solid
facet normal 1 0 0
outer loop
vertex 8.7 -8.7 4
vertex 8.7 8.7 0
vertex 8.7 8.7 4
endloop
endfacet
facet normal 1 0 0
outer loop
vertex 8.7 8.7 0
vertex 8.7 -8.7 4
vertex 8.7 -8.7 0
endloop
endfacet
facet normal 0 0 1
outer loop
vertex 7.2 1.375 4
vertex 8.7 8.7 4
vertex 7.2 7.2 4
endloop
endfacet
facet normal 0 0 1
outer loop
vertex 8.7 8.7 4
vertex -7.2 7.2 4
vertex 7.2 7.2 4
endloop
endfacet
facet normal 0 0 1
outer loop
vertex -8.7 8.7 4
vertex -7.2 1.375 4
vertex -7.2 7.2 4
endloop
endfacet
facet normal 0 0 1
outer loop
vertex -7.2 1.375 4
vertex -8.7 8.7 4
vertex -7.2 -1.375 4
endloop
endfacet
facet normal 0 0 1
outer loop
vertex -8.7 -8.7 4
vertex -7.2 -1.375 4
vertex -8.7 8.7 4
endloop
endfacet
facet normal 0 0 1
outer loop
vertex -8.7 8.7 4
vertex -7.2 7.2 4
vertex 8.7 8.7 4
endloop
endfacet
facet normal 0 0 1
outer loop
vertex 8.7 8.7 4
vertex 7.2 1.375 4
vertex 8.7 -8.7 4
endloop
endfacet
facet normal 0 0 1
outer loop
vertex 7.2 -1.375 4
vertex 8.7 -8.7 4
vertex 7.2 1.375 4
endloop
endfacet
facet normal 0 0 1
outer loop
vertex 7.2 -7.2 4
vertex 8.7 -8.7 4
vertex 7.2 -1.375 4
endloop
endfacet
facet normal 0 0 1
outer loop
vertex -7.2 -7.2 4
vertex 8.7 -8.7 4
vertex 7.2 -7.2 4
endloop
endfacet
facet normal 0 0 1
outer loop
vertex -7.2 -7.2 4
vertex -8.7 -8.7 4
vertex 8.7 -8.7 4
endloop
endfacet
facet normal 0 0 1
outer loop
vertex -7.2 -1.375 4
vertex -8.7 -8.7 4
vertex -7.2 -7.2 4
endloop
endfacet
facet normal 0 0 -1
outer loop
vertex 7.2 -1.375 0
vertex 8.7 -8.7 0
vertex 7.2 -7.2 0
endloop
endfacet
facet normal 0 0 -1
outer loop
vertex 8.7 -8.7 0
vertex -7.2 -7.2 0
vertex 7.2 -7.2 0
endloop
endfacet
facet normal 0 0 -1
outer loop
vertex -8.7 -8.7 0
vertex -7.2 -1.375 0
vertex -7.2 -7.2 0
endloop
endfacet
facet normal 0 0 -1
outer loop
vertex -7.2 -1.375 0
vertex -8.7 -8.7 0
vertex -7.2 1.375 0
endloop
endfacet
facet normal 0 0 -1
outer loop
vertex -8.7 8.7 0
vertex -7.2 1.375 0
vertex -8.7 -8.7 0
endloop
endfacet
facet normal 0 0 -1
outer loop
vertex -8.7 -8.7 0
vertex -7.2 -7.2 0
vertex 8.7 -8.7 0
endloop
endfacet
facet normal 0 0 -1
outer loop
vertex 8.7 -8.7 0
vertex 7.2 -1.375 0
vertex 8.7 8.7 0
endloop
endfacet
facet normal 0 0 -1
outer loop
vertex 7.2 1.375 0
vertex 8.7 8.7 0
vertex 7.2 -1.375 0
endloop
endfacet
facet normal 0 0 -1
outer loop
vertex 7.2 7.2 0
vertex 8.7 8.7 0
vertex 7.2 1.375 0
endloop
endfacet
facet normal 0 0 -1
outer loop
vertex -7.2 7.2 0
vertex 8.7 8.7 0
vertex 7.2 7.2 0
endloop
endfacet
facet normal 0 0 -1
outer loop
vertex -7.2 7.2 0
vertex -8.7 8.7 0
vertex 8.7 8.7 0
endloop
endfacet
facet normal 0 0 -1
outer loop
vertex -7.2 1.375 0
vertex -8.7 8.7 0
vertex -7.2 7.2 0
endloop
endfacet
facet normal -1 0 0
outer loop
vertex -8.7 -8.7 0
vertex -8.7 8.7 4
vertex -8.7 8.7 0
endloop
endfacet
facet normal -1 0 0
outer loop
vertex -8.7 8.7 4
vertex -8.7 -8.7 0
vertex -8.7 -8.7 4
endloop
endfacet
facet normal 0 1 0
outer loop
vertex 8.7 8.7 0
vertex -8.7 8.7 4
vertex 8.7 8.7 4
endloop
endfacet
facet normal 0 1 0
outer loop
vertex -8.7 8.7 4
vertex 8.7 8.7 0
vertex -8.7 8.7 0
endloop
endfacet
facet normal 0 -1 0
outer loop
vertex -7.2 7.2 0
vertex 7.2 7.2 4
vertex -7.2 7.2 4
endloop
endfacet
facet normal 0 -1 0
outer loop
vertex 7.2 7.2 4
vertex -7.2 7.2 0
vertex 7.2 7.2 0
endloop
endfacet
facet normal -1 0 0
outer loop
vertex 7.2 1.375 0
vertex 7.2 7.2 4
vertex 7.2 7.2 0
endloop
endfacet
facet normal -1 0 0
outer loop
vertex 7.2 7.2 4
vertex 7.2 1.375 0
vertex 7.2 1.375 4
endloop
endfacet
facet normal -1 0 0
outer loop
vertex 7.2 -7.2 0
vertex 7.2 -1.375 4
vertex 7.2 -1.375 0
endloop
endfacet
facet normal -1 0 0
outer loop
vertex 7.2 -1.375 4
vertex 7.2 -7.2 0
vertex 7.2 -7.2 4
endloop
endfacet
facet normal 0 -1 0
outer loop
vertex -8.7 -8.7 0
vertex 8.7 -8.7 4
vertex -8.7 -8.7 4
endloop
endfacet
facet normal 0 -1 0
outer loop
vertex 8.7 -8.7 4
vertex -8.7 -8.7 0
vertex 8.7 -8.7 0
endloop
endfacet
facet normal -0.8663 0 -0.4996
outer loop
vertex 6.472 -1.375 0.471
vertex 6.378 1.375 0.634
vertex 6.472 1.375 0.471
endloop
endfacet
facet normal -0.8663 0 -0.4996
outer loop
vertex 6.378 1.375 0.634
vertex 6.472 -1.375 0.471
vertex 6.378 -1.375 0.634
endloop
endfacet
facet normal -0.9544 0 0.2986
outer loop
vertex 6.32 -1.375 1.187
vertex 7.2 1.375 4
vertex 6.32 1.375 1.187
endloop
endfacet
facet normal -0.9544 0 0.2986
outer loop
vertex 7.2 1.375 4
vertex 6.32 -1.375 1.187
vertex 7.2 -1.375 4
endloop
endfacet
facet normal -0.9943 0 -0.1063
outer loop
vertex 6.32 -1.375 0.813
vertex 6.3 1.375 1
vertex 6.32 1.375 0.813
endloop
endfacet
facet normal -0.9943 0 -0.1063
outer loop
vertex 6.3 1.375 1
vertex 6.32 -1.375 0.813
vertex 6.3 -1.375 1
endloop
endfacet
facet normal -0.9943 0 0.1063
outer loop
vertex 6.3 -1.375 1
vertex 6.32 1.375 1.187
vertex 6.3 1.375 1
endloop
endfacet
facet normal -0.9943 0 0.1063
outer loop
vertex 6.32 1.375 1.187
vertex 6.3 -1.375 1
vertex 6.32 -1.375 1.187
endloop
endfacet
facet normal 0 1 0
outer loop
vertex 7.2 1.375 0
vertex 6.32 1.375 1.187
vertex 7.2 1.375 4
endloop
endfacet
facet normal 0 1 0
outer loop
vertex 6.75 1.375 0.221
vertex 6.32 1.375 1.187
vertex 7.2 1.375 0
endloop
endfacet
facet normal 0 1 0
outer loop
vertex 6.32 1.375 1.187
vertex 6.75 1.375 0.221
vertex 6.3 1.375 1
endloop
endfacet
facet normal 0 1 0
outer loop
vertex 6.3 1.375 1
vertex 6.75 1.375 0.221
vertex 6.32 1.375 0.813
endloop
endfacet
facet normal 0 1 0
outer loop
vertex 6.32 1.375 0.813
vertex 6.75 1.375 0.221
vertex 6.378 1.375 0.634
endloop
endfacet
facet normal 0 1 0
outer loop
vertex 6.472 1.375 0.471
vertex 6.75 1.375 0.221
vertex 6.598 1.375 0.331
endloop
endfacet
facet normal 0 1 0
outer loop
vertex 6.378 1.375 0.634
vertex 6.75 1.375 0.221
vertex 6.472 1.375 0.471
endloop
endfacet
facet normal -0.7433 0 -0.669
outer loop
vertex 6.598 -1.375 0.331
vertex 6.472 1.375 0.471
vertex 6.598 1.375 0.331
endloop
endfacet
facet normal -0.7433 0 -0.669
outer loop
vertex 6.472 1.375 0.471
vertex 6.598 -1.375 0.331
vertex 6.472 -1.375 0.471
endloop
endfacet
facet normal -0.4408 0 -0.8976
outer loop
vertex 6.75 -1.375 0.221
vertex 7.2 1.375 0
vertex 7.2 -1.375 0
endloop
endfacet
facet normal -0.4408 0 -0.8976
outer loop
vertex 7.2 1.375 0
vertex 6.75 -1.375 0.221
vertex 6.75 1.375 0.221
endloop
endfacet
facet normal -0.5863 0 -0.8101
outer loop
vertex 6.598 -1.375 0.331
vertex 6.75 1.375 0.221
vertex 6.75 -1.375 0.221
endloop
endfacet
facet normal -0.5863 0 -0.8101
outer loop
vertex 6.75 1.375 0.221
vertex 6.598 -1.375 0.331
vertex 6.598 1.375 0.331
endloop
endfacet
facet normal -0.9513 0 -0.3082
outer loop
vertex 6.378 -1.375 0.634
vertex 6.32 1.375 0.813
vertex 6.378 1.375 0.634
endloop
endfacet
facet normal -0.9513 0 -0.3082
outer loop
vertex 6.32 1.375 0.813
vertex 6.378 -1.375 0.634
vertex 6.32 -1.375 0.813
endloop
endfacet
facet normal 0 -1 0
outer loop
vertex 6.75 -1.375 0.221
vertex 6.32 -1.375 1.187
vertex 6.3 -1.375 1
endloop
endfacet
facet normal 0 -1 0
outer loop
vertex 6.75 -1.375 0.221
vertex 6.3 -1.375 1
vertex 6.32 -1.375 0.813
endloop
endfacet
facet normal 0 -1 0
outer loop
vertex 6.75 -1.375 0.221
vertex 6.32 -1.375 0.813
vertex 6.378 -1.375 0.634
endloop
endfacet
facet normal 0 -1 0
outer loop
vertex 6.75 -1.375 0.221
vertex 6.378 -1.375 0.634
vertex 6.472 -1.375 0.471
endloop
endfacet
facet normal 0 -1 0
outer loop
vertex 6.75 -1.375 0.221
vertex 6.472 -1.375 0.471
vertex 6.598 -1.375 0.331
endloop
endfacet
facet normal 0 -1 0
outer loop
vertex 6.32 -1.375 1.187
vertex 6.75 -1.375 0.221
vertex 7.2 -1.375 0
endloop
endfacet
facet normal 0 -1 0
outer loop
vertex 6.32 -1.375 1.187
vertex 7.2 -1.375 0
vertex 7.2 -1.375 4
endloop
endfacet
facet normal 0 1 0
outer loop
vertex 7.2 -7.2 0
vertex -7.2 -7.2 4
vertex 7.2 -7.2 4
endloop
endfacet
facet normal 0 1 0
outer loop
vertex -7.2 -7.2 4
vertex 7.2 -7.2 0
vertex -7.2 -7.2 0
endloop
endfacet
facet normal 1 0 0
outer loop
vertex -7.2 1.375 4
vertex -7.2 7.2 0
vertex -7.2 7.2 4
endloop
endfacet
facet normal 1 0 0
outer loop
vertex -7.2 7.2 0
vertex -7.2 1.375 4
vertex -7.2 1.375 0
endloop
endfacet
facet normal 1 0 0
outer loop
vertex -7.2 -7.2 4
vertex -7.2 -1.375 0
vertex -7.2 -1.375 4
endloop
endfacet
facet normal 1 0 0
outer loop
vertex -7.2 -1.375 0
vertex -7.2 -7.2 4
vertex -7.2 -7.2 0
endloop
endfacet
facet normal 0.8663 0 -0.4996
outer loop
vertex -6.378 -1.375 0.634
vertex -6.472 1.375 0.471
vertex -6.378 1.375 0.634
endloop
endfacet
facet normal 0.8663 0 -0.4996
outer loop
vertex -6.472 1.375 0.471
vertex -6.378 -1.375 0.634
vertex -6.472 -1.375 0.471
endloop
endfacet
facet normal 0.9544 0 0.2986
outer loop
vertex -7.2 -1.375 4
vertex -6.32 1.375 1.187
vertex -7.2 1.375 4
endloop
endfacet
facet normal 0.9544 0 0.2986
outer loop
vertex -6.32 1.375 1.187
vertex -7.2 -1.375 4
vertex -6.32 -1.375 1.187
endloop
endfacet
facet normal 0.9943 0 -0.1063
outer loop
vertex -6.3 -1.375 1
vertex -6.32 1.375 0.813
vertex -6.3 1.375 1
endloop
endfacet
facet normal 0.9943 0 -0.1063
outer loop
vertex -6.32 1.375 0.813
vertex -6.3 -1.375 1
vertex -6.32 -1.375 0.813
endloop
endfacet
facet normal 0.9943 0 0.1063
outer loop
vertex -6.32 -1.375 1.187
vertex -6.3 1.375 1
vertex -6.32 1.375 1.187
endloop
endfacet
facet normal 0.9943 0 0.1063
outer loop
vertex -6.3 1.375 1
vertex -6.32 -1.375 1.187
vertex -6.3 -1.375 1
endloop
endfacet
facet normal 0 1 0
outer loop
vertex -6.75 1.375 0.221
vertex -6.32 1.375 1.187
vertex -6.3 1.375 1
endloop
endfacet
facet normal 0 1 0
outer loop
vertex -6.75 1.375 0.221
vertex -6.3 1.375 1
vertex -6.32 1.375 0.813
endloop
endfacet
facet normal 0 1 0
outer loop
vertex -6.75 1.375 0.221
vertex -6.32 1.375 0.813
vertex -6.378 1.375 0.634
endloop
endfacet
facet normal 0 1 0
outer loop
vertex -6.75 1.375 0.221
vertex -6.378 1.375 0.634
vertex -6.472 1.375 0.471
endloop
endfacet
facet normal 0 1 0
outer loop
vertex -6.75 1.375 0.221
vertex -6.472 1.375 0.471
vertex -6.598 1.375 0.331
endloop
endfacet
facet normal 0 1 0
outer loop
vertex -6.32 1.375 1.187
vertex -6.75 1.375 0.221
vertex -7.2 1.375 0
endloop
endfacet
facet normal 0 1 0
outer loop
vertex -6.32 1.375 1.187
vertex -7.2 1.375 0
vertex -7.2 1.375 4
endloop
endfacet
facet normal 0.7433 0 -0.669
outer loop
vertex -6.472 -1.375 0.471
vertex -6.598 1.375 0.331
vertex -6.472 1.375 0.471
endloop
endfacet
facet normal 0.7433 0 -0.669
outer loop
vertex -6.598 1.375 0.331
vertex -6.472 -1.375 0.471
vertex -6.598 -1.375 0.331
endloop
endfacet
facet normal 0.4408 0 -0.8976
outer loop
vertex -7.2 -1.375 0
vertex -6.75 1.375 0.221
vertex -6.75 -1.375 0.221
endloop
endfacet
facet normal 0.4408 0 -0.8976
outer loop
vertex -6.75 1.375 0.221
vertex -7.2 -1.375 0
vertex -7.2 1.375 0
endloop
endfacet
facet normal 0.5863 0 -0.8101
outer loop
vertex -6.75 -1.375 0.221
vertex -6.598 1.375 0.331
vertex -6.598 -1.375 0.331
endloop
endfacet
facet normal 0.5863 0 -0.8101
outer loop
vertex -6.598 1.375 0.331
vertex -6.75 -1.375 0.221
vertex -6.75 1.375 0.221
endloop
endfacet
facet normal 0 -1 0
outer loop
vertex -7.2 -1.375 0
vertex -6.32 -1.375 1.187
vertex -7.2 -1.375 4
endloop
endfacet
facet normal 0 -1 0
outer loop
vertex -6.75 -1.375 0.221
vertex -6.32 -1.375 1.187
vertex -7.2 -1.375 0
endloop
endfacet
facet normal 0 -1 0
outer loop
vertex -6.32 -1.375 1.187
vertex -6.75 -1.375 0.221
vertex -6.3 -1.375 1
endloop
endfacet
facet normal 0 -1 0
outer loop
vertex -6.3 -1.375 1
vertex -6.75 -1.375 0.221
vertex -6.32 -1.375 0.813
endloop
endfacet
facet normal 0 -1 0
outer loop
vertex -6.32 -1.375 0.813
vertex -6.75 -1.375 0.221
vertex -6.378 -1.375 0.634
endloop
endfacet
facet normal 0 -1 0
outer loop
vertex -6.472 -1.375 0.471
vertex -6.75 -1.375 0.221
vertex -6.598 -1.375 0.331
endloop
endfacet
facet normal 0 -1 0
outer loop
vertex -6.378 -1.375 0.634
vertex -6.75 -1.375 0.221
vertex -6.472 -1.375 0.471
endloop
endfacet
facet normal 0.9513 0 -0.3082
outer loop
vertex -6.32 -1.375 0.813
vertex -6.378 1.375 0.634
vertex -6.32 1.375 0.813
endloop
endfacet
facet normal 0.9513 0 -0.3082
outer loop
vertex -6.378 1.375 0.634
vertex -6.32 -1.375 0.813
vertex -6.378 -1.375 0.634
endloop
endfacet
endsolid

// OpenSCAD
union () {
  union () {
    translate ([0, 7.95, 2]) {
      cube ([17.4, 1.5, 4], center=true);
    }
    translate ([7.95, 0, 2]) {
      cube ([1.5, 17.4, 4], center=true);
    }
    hull () {
      translate ([7.95, 0, 2]) {
        cube ([1.5, 2.75, 4], center=true);
      }
      translate ([7.2, 0, 1]) {
        rotate (a=90.0, v=[1, 0, 0]) {
          cylinder ($fn=30, h=2.75, r=0.9, center=true);
        }
      }
    }
  }
  mirror ([0, 1, 0]) {
    mirror ([1, 0, 0]) {
      union () {
        translate ([0, 7.95, 2]) {
          cube ([17.4, 1.5, 4], center=true);
        }
        translate ([7.95, 0, 2]) {
          cube ([1.5, 17.4, 4], center=true);
        }
        hull () {
          translate ([7.95, 0, 2]) {
            cube ([1.5, 2.75, 4], center=true);
          }
          translate ([7.2, 0, 1]) {
            rotate (a=90.0, v=[1, 0, 0]) {
              cylinder ($fn=30, h=2.75, r=0.9, center=true);
            }
          }
        }
      }
    }
  }
}
